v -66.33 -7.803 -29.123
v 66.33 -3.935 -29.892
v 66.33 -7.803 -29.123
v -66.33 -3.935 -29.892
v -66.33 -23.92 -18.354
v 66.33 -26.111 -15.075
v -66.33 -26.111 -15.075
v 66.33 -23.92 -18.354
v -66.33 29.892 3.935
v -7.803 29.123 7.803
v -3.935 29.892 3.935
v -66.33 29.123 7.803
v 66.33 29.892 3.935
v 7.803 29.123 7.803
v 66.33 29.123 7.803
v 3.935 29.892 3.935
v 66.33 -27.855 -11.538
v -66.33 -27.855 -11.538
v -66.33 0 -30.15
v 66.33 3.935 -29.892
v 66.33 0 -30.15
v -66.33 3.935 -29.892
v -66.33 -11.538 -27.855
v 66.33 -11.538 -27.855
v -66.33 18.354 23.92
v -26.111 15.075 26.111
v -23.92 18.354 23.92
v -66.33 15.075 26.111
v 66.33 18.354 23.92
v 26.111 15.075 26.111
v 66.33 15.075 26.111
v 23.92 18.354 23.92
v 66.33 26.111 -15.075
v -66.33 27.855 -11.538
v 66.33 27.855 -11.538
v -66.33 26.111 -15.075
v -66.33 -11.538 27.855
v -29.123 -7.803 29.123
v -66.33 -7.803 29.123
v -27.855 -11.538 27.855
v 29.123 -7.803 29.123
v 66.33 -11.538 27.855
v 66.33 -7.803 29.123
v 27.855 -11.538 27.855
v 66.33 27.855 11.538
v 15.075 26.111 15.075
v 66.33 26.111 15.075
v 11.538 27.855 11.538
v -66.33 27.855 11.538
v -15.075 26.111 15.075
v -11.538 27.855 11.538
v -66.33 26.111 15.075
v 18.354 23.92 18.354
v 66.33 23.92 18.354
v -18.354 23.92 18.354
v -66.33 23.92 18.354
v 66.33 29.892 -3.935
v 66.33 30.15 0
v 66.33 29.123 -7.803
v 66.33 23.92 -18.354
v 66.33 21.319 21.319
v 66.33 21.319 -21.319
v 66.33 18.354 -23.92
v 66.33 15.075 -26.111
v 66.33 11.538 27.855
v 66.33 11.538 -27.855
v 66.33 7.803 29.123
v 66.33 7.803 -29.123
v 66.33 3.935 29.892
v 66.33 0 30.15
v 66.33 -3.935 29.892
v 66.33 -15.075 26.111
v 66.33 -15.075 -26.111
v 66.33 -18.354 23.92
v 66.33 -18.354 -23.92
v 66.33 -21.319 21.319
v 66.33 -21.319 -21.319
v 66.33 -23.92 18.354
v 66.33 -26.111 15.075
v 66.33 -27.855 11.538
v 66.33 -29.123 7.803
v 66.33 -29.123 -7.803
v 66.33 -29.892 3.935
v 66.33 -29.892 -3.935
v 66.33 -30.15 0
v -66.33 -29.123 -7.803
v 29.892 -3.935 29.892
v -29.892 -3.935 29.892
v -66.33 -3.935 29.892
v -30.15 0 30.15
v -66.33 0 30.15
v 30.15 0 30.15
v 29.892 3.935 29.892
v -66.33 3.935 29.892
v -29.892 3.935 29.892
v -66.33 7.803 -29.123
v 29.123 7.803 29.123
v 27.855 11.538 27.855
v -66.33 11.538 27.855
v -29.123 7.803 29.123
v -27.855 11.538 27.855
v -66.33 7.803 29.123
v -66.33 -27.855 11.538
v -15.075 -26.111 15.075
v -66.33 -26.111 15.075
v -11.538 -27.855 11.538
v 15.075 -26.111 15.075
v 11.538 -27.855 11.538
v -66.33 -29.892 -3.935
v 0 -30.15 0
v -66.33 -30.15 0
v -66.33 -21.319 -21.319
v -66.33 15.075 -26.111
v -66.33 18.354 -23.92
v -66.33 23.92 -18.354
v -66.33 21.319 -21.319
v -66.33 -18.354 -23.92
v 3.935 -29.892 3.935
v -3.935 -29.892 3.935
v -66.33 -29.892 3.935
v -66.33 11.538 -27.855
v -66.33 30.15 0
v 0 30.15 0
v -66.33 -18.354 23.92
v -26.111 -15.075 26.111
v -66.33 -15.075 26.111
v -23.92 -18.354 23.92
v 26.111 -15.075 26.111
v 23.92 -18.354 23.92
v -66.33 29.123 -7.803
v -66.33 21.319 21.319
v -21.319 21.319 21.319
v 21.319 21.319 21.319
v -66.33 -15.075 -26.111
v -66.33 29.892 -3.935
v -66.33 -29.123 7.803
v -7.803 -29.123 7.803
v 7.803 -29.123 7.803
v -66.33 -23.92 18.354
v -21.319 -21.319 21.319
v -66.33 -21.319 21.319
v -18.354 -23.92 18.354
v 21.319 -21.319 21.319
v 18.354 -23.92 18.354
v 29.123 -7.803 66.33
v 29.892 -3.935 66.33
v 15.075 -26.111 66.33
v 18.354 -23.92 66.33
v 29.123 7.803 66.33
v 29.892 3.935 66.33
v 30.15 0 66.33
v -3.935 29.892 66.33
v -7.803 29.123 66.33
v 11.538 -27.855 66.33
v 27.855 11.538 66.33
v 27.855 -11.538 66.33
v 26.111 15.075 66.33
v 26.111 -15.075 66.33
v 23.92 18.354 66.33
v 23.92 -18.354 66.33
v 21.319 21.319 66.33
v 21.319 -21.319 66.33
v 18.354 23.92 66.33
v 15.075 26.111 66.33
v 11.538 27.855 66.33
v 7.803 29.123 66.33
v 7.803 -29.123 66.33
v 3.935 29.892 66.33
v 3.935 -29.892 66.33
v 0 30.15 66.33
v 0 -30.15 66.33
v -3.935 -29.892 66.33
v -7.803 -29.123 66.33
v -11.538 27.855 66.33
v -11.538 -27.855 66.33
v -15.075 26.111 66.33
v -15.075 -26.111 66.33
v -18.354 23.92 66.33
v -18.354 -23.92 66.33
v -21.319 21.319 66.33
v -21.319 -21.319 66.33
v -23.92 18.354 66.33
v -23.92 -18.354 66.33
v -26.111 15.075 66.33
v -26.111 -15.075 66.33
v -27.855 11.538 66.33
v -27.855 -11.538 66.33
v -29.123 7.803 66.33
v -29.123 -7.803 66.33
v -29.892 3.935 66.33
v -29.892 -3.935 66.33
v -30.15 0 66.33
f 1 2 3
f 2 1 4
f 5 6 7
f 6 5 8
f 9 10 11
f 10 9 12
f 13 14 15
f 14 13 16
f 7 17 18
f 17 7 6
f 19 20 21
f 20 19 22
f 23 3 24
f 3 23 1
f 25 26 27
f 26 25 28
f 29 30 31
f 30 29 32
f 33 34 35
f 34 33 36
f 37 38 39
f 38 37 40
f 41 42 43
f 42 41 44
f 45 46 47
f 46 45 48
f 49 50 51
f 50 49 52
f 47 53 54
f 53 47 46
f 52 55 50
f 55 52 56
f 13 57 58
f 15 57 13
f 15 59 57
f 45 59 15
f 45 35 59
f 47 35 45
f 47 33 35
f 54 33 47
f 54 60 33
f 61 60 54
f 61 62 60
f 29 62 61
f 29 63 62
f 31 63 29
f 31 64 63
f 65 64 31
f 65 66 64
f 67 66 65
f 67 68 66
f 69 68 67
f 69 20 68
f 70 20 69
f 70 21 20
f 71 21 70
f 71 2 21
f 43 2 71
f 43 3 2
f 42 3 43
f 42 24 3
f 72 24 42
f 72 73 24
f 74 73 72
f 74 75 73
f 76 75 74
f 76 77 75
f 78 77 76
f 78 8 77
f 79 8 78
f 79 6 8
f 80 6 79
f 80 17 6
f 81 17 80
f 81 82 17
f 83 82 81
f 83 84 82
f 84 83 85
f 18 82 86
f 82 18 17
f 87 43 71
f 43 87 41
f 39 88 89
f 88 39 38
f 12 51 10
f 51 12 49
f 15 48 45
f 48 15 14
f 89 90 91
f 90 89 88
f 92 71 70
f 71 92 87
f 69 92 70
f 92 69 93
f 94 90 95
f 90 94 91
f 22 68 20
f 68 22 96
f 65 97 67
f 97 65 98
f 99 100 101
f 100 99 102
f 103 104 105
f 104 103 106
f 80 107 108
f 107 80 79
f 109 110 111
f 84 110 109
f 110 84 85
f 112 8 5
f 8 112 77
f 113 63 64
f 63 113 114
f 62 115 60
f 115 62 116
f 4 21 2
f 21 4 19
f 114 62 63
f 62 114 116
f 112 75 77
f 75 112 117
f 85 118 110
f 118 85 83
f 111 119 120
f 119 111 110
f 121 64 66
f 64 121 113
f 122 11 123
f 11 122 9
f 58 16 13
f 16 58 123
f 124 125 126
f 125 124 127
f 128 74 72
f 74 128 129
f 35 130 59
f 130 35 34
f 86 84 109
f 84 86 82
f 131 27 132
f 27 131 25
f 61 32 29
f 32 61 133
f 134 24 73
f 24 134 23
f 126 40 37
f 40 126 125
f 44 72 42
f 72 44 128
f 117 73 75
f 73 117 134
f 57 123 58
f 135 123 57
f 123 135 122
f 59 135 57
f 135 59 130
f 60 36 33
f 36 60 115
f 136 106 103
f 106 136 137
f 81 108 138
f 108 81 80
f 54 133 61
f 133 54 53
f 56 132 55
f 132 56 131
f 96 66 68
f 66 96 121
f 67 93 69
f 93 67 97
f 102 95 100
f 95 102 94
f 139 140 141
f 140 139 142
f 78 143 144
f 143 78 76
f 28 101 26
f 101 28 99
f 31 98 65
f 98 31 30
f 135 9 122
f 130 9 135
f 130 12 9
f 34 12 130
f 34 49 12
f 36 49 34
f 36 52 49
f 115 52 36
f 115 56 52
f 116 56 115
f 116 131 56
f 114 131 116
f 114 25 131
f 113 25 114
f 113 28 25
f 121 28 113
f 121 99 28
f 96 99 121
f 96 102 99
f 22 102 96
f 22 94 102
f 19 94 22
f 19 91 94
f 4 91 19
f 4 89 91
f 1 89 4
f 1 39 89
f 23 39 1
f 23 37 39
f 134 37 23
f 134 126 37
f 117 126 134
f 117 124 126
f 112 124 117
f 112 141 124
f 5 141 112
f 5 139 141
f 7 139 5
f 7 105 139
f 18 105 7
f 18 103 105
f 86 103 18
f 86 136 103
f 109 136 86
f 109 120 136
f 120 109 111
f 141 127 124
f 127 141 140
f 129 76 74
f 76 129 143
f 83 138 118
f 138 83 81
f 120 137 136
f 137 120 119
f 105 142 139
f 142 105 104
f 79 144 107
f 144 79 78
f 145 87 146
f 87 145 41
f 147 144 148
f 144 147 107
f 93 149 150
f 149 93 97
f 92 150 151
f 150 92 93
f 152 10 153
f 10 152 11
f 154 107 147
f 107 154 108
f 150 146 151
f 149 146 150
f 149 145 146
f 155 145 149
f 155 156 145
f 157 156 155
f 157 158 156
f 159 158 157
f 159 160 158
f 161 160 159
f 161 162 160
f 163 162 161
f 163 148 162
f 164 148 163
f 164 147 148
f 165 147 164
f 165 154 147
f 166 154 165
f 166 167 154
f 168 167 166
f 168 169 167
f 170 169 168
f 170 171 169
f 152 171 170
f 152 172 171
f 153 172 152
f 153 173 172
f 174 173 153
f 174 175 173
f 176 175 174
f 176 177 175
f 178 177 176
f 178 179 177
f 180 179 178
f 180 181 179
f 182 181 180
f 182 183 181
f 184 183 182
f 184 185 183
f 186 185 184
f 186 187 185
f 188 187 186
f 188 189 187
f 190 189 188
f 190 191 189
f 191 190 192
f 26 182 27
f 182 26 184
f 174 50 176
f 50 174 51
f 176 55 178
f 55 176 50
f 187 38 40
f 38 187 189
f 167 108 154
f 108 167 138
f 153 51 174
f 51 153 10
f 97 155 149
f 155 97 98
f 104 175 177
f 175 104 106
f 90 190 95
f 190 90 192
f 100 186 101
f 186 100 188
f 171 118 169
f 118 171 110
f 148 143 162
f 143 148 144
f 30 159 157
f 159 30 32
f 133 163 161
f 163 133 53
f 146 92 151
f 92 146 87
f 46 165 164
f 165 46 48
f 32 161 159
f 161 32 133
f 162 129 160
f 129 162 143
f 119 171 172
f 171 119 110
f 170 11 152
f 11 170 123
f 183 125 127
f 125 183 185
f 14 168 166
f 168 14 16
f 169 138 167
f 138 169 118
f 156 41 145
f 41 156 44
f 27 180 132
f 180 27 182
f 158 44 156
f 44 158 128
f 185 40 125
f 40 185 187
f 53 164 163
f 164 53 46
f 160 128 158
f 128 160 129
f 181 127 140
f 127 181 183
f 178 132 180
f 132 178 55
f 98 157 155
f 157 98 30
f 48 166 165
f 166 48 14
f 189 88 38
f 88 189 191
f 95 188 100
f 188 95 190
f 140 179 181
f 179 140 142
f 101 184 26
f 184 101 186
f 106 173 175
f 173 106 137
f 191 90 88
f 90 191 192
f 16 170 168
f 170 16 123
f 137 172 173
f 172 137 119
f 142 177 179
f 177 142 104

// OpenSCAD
// Auto-generated by scripts/author_from_manifest.py (Phase D.3).
// Source: data/phase_d_manifest.json (sku_intent='anvil-reducing-tee-threaded-2x1in').
// Do not hand-edit — regenerate from the manifest.
//
// @part anvil_reducing_tee_threaded_2x1in
// @kind fitting
// @category fitting.tee
// @display-name "Anvil FIG 10 Threaded Reducing Tee 2\" x 1\""
// @mfg anvil_international
// @mfg-pn FIG_10_2x1
// @listing UL FM
// @price-usd 28.00
// @install-minutes 6
// @crew journeyman
// @param size_in number default=2 label="Size" unit="in"
// @port run_in position=[-0.05,0,0] direction=[-1,0,0] style=grooved size_in=2 role=run_a
// @port run_out position=[0.05,0,0] direction=[1,0,0] style=grooved size_in=2 role=run_b
// @port branch position=[0,0,0.05] direction=[0,0,1] style=grooved size_in=2 role=branch

size_in = 2.0;

function od_mm(nps) =
    nps ==   1  ? 33.4 :
    nps == 1.25 ? 42.2 :
    nps == 1.5  ? 48.3 :
    nps ==   2  ? 60.3 :
    nps == 2.5  ? 73.0 :
    nps ==   3  ? 88.9 :
    nps ==   4  ? 114.3 :
    nps ==   5  ? 141.3 :
    nps ==   6  ? 168.3 :
    nps ==   8  ? 219.1 :
    nps ==  10  ? 273.0 : 60.3;

od = od_mm(size_in);
run_len    = od * 2.2;
branch_len = od * 1.1;

union() {
    // Run along X
    rotate([0, 90, 0])
        cylinder(h = run_len, d = od, center = true, $fn = 48);
    // Branch along +Z
    translate([0, 0, branch_len/2])
        cylinder(h = branch_len, d = od, center = true, $fn = 48);
}
